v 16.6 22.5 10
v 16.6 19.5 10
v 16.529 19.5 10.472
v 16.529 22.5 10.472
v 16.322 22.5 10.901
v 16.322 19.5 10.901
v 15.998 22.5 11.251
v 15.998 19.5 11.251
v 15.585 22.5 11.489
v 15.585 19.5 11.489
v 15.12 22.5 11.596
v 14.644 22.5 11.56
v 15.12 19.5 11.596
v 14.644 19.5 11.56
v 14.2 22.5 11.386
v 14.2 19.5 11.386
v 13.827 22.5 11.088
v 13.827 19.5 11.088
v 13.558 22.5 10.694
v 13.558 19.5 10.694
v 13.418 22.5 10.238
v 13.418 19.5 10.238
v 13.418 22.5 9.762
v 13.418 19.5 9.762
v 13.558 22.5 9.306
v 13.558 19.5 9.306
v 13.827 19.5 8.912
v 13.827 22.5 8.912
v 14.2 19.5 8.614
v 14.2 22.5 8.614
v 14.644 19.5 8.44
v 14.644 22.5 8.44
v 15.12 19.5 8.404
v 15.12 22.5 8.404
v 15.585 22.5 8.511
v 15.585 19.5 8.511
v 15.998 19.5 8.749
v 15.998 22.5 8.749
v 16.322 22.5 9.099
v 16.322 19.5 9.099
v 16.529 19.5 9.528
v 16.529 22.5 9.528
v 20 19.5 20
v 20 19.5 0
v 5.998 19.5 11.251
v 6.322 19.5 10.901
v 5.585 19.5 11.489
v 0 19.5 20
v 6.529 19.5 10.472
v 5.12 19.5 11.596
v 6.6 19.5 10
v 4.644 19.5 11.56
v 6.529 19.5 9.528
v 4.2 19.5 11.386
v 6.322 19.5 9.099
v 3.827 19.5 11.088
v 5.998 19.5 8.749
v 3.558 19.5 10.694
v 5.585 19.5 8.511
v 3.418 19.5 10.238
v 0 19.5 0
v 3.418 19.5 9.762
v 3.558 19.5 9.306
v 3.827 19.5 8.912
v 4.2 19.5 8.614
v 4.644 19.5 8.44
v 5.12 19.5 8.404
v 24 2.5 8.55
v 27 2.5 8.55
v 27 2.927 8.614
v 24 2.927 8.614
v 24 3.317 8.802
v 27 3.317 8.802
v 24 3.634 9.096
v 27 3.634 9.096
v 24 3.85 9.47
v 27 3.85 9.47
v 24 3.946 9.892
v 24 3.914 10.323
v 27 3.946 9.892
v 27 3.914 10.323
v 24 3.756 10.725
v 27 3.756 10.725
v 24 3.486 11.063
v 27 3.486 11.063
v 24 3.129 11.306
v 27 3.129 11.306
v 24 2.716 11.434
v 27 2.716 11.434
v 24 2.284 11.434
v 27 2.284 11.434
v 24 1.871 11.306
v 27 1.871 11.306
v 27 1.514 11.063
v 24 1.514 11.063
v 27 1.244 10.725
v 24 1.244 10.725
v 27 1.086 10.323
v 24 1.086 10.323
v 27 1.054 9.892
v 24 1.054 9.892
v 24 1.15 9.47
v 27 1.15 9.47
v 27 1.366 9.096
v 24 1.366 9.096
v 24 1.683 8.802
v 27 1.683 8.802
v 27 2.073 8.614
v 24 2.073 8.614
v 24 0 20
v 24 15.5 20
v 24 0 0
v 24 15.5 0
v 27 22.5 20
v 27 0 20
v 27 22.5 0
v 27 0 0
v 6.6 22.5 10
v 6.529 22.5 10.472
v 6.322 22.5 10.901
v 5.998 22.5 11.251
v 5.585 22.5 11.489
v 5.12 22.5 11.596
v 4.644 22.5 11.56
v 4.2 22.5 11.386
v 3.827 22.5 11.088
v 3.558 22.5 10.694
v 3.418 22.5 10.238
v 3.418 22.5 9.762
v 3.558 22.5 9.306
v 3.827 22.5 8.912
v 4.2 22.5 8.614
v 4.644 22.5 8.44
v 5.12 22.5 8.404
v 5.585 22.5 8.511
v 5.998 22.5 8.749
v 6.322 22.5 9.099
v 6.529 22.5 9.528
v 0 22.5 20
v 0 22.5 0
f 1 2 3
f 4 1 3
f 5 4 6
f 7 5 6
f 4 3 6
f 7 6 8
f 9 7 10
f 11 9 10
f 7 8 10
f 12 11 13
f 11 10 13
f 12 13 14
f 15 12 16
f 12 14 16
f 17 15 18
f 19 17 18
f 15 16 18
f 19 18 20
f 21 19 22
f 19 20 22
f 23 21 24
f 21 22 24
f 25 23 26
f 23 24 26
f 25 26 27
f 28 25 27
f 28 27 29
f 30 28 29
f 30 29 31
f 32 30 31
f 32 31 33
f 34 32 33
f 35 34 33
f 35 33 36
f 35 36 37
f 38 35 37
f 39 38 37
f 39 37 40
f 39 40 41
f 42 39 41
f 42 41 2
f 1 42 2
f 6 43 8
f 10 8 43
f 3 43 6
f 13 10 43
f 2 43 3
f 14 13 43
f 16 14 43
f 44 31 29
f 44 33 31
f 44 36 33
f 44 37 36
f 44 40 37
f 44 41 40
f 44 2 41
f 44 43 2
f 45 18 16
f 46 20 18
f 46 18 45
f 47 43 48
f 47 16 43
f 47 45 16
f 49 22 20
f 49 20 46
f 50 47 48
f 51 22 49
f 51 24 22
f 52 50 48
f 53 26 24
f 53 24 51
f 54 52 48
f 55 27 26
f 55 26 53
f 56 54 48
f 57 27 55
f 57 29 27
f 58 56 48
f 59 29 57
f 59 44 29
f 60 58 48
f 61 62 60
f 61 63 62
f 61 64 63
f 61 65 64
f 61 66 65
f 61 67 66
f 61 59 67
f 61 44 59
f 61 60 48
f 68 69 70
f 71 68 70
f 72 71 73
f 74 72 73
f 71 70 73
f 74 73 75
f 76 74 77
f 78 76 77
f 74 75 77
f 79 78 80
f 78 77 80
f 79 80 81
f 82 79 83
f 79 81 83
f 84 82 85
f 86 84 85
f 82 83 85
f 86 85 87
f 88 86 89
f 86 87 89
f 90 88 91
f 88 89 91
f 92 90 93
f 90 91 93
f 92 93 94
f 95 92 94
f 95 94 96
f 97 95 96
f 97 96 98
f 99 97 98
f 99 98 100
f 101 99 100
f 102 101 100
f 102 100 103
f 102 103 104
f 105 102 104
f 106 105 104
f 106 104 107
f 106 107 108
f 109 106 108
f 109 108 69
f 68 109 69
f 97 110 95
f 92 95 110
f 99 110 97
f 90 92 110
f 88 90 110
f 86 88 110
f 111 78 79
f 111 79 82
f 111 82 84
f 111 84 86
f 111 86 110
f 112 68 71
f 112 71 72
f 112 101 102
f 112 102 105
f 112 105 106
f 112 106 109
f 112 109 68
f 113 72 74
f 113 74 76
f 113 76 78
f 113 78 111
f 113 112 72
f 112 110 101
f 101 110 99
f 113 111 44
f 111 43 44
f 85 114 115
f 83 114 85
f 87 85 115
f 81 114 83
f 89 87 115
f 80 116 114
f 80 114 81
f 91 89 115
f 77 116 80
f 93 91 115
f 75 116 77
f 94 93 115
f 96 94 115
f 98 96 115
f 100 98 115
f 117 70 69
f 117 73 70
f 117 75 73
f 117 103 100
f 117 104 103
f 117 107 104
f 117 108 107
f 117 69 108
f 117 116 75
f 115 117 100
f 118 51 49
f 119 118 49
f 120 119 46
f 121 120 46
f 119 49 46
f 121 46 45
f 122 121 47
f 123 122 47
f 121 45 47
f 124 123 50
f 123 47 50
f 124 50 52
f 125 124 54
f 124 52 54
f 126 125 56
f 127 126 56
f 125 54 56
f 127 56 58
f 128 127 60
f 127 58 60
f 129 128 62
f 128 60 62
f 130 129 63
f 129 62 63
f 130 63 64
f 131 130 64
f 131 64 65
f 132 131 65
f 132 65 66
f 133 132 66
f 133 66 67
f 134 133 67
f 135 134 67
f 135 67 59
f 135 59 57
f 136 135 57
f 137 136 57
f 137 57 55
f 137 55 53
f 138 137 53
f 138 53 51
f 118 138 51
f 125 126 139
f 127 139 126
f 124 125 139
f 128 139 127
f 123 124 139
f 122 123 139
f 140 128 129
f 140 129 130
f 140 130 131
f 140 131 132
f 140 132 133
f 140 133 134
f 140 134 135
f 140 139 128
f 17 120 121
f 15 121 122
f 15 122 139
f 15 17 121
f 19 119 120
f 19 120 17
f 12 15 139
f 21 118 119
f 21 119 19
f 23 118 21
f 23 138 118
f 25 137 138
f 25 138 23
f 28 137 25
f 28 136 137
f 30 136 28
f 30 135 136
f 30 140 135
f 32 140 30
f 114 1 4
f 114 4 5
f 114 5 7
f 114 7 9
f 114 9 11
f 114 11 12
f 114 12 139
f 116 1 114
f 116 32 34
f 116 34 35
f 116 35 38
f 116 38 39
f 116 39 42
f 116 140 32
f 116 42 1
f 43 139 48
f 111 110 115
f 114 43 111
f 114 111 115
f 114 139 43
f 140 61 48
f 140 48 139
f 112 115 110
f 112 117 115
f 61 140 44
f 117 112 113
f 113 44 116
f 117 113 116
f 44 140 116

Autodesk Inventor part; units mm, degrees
ref_plane "YZ Plane" through (0, 0, 0) normal (1, 0, 0) x (0, 1, 0)
ref_plane "XZ Plane" through (0, 0, 0) normal (0, 1, 0) x (-1, 0, 0)
ref_plane "XY Plane" through (0, 0, 0) normal (0, 0, 1) x (1, 0, 0)
sketch "Sketch1" plane through (0, 0, 0) normal (0, 0, 1) x (1, 0, 0)
  line L0 (0, 22.5) -> (27, 22.5)
  line L1 (27, 22.5) -> (27, 0)
  line L2 (27, 0) -> (24, 0)
  line L3 (24, 0) -> (24, 19.5)
  line L4 (24, 19.5) -> (0, 19.5)
  line L5 (0, 19.5) -> (0, 22.5)
  line L6 (-5.4, 0) -> (32.4, 0) construction
  line L7 (0, -4.5) -> (0, 27) construction
  point P0 (0, 0)
  dimension "d0" = 3
  dimension "d1" = 3
  dimension "d2" = 22.5
  dimension "d3" = 27
extrude "Extrusion1" add sketch "Sketch1" along normal blind 20
chamfer "Chamfer1" distance 4 angle 45 1 edges at (24, 19.5, 10)
sketch "Sketch2" plane through (27, 0, 0) normal (1, 0, 0) x (0, 0, -1)
  circle A0 centre (-10, 2.5) radius 1.45
  line L0 (0, 0) -> (-20, 0) construction
  line L1 (-10, 0) -> (-10, 2.5) construction
  dimension "d9" = 2.9
  dimension "d10" = 2.5
extrude "Extrusion2" cut sketch "Sketch2" against normal up to surface (3 mm away)
sketch "Sketch3" plane through (0, 19.5, 0) normal (0, -1, 0) x (1, 0, 0)
  circle A0 centre (5, 10) radius 1.6
  circle A1 centre (15, 10) radius 1.6
  line L0 (0, 0) -> (0, 20) construction
  line L1 (0, 10) -> (20, 10) construction
  line L2 (20, 20) -> (20, 0) construction
  dimension "d13" = 3.2
  dimension "d14" = 5
  dimension "d15" = 5
extrude "Extrusion3" cut sketch "Sketch3" against normal up to surface (3 mm away)
properties part number "Motor_Holder"
